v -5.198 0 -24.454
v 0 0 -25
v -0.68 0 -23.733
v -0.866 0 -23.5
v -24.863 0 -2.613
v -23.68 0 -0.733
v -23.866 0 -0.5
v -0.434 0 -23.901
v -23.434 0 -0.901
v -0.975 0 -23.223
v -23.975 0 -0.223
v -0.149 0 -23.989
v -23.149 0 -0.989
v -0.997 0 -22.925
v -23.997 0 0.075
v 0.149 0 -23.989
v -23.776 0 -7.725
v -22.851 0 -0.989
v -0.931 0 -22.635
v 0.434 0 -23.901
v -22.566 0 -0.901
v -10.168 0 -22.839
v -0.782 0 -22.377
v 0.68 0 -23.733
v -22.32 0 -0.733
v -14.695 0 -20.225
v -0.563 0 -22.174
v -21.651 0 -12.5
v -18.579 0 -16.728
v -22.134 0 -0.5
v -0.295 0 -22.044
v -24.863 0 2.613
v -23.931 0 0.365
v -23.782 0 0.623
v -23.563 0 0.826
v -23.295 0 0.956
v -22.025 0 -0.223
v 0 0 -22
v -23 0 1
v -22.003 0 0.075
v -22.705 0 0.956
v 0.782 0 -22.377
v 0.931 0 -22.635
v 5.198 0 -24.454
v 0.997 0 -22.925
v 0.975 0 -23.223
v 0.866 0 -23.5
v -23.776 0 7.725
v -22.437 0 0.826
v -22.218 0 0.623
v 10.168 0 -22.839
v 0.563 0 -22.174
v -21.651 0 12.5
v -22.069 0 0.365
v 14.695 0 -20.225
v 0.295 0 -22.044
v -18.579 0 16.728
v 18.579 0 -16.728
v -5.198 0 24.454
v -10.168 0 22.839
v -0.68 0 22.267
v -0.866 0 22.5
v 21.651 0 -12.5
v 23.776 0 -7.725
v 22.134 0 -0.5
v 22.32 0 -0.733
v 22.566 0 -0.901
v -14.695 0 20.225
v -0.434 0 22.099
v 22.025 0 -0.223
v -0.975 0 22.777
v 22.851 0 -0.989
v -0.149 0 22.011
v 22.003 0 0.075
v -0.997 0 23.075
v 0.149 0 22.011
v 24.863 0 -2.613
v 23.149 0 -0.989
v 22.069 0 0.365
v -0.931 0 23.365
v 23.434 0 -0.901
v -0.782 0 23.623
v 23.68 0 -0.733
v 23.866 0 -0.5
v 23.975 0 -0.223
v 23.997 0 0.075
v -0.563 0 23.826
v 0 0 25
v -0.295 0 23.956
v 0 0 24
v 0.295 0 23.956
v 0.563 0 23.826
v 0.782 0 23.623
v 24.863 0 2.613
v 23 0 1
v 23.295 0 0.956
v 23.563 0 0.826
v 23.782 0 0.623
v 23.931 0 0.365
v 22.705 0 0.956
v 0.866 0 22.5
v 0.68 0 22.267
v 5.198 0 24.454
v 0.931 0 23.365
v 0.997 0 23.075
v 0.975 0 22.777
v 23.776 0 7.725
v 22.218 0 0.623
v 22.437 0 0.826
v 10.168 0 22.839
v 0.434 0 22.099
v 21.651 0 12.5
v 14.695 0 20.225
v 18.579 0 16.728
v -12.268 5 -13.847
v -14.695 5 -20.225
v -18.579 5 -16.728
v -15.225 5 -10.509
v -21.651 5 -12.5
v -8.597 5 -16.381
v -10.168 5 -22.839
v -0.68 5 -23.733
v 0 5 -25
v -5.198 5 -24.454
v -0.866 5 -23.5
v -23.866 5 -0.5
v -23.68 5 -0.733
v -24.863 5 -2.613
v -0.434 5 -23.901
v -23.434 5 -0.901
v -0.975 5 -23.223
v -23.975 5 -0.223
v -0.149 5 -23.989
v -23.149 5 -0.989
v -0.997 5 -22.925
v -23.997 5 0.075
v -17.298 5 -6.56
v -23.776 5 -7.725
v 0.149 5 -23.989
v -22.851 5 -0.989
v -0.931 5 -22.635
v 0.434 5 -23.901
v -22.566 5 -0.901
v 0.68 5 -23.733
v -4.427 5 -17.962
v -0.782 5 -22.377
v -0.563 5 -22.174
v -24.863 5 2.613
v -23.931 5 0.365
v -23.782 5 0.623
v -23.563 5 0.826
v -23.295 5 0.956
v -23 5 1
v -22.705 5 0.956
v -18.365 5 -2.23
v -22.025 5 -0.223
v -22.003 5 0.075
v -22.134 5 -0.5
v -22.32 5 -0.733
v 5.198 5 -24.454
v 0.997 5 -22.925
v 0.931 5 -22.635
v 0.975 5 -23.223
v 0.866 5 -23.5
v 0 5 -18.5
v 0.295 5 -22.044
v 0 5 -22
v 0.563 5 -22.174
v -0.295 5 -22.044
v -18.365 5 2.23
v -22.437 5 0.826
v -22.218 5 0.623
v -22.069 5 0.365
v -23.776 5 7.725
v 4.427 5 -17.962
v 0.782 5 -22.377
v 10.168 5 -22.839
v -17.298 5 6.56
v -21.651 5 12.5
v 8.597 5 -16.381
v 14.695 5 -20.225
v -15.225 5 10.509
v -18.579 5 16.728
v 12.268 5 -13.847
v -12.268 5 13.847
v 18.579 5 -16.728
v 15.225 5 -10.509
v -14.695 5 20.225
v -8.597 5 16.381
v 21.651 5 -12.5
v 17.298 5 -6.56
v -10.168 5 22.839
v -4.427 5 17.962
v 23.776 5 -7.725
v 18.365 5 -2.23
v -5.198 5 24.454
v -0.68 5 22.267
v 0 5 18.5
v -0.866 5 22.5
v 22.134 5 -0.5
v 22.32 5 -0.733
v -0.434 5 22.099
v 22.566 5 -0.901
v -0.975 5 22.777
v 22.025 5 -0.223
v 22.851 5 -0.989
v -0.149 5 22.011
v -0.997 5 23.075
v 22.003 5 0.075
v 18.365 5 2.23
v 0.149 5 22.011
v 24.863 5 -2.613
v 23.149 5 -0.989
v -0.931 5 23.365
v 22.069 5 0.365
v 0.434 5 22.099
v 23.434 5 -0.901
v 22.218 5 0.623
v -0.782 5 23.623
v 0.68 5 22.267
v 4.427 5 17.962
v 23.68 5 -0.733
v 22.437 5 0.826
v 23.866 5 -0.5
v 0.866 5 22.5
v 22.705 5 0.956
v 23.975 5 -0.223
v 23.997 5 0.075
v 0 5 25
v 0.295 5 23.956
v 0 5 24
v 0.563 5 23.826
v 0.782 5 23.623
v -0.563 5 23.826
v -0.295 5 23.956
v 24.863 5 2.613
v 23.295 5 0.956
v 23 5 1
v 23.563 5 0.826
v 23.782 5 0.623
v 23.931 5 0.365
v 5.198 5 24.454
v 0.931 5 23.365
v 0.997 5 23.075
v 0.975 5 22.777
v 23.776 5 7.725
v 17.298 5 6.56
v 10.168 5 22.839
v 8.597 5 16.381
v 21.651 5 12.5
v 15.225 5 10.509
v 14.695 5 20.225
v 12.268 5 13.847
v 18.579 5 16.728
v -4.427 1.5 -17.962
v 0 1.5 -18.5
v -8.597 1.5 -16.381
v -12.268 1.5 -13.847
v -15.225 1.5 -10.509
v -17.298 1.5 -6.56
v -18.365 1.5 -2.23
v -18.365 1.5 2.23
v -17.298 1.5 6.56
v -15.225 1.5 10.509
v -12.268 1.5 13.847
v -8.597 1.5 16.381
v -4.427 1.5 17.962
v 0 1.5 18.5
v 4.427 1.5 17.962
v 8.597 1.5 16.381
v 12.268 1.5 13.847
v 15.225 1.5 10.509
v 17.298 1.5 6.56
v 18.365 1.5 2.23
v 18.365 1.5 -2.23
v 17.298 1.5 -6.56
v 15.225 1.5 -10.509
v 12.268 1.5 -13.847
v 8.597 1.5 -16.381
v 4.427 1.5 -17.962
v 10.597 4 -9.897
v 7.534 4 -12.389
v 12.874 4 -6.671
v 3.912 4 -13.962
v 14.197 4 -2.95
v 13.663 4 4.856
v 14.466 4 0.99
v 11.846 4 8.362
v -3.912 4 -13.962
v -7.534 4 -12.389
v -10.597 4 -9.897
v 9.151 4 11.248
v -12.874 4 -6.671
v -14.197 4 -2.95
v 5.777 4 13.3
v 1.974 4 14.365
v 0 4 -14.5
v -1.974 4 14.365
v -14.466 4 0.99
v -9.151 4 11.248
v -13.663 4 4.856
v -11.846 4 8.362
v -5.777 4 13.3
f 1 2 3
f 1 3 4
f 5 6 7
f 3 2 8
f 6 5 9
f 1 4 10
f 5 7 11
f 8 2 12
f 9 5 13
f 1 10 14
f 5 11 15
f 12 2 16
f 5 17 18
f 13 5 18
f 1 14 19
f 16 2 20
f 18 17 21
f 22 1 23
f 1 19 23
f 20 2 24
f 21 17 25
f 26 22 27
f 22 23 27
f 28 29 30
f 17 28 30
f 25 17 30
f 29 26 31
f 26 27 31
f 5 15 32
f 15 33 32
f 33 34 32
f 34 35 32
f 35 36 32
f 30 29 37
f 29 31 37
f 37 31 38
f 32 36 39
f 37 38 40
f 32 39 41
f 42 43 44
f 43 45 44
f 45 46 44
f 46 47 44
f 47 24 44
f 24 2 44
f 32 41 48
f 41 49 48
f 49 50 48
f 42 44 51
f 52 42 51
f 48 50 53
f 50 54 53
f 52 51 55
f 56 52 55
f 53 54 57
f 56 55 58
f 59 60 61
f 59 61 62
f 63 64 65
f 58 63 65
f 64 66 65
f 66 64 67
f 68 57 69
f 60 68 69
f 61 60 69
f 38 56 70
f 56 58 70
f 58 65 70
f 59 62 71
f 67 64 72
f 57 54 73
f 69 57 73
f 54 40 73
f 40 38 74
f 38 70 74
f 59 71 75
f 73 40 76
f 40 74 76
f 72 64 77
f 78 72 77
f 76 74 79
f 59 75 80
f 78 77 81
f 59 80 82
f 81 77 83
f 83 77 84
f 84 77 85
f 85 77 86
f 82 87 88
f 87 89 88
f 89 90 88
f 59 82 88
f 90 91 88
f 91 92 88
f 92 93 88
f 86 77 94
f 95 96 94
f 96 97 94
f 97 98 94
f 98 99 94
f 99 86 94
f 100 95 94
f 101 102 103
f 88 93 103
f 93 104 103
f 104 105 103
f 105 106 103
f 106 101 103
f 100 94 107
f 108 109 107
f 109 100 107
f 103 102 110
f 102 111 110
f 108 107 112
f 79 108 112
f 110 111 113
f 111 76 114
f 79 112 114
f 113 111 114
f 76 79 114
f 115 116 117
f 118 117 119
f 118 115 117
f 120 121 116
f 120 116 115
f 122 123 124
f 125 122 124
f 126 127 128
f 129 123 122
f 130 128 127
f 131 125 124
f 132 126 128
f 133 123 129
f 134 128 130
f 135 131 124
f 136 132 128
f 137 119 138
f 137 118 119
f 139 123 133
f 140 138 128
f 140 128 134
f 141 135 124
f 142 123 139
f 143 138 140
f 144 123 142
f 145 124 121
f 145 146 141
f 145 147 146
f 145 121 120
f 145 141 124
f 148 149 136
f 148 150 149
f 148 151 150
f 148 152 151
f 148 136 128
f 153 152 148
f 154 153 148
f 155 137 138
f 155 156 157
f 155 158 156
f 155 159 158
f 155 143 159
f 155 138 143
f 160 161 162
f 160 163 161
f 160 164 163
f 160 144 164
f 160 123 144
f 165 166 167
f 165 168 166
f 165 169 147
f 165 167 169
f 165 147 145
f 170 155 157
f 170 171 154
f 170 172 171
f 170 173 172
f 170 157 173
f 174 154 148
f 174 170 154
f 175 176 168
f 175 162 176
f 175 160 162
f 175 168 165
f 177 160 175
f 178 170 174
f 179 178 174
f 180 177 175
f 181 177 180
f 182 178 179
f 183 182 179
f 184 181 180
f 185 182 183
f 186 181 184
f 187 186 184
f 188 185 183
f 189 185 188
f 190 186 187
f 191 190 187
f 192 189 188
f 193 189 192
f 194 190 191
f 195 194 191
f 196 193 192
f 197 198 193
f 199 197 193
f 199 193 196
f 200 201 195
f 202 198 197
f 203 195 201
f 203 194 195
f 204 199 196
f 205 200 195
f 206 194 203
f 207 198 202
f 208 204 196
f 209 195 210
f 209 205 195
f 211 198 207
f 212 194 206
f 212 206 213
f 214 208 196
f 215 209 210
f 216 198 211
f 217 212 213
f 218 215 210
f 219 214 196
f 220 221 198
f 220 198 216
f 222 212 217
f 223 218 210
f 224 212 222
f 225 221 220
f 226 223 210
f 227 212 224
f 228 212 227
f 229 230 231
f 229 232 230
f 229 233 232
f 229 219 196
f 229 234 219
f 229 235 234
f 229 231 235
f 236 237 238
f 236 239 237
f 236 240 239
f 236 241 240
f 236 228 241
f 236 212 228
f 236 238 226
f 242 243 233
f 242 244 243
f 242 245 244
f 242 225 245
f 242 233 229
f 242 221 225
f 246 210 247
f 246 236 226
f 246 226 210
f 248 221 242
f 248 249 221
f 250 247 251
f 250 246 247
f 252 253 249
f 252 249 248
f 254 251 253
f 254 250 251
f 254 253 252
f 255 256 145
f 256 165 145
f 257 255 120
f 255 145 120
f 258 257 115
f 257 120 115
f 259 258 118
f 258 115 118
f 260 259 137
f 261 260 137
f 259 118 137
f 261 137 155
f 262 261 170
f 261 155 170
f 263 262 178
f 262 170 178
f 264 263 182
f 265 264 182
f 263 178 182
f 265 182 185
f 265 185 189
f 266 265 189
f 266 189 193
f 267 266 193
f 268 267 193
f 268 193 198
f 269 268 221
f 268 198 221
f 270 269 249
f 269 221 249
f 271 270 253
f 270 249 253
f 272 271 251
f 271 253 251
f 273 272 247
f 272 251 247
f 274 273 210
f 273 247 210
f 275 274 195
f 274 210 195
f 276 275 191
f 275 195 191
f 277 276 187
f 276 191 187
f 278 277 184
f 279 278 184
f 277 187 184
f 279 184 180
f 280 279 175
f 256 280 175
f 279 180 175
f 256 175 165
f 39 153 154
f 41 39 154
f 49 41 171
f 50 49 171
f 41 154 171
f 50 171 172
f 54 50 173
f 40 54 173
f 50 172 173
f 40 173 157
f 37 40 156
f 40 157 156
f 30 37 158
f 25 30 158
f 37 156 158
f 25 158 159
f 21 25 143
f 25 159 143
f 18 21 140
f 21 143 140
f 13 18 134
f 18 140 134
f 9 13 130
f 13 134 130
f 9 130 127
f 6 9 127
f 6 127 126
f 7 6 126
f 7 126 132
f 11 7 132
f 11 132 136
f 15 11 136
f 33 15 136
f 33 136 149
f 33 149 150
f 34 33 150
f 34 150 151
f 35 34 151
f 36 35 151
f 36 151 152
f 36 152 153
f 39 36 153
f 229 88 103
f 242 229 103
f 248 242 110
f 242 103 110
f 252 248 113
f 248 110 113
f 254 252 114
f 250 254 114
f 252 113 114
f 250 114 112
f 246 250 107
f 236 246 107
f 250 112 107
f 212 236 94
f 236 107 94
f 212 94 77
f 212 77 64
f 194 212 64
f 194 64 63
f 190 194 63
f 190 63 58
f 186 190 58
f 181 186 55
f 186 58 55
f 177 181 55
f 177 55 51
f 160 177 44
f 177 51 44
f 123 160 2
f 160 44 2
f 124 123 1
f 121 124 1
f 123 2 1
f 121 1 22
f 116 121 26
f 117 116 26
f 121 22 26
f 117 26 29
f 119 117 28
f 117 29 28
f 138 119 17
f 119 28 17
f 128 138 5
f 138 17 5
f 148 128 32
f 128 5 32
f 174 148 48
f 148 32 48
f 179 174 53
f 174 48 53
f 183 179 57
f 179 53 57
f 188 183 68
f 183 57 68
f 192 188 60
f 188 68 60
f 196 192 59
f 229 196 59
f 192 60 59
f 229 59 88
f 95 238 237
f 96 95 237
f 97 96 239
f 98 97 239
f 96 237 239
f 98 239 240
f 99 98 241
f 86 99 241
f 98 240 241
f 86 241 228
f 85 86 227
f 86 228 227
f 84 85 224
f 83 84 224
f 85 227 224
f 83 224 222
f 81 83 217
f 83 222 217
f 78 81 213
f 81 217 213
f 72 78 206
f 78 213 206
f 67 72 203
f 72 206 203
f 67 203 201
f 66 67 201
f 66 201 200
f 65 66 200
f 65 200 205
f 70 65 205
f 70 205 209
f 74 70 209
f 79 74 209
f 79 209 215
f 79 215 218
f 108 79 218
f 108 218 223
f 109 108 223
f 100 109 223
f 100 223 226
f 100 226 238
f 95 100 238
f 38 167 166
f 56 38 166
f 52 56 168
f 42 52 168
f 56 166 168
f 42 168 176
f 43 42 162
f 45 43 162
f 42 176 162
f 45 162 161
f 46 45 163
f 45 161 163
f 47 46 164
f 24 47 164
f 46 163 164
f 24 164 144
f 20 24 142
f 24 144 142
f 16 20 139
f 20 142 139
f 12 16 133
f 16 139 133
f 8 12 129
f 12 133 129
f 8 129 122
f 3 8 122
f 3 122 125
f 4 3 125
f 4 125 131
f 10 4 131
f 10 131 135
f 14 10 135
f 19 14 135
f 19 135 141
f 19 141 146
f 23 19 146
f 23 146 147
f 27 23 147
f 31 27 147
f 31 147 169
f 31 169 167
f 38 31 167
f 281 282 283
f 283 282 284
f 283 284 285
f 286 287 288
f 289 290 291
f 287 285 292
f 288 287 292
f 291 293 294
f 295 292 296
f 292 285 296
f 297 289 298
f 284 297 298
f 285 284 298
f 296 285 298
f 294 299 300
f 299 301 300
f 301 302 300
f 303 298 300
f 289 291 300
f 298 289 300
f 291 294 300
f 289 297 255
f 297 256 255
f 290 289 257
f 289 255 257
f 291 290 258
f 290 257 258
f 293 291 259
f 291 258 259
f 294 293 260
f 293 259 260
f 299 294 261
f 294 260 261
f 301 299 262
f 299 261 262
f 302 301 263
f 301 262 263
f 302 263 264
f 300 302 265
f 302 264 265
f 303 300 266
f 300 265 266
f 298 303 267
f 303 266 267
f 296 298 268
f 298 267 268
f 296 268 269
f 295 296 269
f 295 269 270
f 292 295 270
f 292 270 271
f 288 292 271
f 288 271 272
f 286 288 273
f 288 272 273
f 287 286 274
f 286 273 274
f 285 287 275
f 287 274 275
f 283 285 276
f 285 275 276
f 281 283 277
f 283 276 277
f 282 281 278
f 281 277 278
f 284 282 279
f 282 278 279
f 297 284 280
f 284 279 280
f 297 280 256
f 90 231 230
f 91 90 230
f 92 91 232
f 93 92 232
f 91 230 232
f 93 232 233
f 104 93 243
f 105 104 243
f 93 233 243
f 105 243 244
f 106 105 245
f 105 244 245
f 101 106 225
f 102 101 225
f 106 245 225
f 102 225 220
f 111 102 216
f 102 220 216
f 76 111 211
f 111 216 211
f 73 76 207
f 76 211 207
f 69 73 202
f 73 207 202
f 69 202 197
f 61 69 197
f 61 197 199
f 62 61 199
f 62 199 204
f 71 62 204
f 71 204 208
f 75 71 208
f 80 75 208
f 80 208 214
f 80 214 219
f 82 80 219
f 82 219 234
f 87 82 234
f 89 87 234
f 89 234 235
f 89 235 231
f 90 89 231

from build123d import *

# Parameters (mm, degrees)
SKETCH_1_R          = 25
EXTRUDE_1_DEPTH     = 5
SKETCH_4_W          = 14.5
SKETCH_4_H          = 1
SKETCH_5_R          = 1
CUT_EXTRUDE_3_DEPTH = 36.707142143


with BuildPart() as part:
    # 草图1 → 凸台-拉伸1 (new body)
    with BuildSketch(Plane(origin=(0, 0, 0), x_dir=(1, 0, 0), z_dir=(0, 1, 0))):
        with Locations(Location((0, 0, 0), (0, 0, 270))):
            Circle(SKETCH_1_R)
    extrude(amount=EXTRUDE_1_DEPTH)

    # 草图4 → 切除-旋转1 (revolve, cut)
    with BuildSketch(Plane.XY, mode=Mode.PRIVATE) as cut_revolve_1_sk:
        with Locations((7.25, 4.5)):
            Rectangle(SKETCH_4_W, SKETCH_4_H)
        Polygon((18.5, 1.5), (18.5, 5), (14.5, 5), (14.5, 4), align=None)
    revolve(cut_revolve_1_sk.sketch.rotate(Axis((0, 0, 0), (0, 1, 0)), 90), axis=Axis((0, 0, 0), (0, 1, 0)), mode=Mode.SUBTRACT)

    # 草图5 → 切除-拉伸3 (cut, through all)
    with BuildSketch(Plane(origin=(0, 5, 0), x_dir=(1, 0, 0), z_dir=(0, 1, 0))):
        with Locations(Location((0, 23, 0), (0, 0, 270))):
            Circle(SKETCH_5_R)
        with Locations(Location((23, 0, 0), (0, 0, 270))):
            Circle(SKETCH_5_R)
        with Locations(Location((0, -23, 0), (0, 0, 270))):
            Circle(SKETCH_5_R)
        with Locations(Location((-23, 0, 0), (0, 0, 270))):
            Circle(SKETCH_5_R)
    extrude(amount=-CUT_EXTRUDE_3_DEPTH, mode=Mode.SUBTRACT)


solid = part.part
